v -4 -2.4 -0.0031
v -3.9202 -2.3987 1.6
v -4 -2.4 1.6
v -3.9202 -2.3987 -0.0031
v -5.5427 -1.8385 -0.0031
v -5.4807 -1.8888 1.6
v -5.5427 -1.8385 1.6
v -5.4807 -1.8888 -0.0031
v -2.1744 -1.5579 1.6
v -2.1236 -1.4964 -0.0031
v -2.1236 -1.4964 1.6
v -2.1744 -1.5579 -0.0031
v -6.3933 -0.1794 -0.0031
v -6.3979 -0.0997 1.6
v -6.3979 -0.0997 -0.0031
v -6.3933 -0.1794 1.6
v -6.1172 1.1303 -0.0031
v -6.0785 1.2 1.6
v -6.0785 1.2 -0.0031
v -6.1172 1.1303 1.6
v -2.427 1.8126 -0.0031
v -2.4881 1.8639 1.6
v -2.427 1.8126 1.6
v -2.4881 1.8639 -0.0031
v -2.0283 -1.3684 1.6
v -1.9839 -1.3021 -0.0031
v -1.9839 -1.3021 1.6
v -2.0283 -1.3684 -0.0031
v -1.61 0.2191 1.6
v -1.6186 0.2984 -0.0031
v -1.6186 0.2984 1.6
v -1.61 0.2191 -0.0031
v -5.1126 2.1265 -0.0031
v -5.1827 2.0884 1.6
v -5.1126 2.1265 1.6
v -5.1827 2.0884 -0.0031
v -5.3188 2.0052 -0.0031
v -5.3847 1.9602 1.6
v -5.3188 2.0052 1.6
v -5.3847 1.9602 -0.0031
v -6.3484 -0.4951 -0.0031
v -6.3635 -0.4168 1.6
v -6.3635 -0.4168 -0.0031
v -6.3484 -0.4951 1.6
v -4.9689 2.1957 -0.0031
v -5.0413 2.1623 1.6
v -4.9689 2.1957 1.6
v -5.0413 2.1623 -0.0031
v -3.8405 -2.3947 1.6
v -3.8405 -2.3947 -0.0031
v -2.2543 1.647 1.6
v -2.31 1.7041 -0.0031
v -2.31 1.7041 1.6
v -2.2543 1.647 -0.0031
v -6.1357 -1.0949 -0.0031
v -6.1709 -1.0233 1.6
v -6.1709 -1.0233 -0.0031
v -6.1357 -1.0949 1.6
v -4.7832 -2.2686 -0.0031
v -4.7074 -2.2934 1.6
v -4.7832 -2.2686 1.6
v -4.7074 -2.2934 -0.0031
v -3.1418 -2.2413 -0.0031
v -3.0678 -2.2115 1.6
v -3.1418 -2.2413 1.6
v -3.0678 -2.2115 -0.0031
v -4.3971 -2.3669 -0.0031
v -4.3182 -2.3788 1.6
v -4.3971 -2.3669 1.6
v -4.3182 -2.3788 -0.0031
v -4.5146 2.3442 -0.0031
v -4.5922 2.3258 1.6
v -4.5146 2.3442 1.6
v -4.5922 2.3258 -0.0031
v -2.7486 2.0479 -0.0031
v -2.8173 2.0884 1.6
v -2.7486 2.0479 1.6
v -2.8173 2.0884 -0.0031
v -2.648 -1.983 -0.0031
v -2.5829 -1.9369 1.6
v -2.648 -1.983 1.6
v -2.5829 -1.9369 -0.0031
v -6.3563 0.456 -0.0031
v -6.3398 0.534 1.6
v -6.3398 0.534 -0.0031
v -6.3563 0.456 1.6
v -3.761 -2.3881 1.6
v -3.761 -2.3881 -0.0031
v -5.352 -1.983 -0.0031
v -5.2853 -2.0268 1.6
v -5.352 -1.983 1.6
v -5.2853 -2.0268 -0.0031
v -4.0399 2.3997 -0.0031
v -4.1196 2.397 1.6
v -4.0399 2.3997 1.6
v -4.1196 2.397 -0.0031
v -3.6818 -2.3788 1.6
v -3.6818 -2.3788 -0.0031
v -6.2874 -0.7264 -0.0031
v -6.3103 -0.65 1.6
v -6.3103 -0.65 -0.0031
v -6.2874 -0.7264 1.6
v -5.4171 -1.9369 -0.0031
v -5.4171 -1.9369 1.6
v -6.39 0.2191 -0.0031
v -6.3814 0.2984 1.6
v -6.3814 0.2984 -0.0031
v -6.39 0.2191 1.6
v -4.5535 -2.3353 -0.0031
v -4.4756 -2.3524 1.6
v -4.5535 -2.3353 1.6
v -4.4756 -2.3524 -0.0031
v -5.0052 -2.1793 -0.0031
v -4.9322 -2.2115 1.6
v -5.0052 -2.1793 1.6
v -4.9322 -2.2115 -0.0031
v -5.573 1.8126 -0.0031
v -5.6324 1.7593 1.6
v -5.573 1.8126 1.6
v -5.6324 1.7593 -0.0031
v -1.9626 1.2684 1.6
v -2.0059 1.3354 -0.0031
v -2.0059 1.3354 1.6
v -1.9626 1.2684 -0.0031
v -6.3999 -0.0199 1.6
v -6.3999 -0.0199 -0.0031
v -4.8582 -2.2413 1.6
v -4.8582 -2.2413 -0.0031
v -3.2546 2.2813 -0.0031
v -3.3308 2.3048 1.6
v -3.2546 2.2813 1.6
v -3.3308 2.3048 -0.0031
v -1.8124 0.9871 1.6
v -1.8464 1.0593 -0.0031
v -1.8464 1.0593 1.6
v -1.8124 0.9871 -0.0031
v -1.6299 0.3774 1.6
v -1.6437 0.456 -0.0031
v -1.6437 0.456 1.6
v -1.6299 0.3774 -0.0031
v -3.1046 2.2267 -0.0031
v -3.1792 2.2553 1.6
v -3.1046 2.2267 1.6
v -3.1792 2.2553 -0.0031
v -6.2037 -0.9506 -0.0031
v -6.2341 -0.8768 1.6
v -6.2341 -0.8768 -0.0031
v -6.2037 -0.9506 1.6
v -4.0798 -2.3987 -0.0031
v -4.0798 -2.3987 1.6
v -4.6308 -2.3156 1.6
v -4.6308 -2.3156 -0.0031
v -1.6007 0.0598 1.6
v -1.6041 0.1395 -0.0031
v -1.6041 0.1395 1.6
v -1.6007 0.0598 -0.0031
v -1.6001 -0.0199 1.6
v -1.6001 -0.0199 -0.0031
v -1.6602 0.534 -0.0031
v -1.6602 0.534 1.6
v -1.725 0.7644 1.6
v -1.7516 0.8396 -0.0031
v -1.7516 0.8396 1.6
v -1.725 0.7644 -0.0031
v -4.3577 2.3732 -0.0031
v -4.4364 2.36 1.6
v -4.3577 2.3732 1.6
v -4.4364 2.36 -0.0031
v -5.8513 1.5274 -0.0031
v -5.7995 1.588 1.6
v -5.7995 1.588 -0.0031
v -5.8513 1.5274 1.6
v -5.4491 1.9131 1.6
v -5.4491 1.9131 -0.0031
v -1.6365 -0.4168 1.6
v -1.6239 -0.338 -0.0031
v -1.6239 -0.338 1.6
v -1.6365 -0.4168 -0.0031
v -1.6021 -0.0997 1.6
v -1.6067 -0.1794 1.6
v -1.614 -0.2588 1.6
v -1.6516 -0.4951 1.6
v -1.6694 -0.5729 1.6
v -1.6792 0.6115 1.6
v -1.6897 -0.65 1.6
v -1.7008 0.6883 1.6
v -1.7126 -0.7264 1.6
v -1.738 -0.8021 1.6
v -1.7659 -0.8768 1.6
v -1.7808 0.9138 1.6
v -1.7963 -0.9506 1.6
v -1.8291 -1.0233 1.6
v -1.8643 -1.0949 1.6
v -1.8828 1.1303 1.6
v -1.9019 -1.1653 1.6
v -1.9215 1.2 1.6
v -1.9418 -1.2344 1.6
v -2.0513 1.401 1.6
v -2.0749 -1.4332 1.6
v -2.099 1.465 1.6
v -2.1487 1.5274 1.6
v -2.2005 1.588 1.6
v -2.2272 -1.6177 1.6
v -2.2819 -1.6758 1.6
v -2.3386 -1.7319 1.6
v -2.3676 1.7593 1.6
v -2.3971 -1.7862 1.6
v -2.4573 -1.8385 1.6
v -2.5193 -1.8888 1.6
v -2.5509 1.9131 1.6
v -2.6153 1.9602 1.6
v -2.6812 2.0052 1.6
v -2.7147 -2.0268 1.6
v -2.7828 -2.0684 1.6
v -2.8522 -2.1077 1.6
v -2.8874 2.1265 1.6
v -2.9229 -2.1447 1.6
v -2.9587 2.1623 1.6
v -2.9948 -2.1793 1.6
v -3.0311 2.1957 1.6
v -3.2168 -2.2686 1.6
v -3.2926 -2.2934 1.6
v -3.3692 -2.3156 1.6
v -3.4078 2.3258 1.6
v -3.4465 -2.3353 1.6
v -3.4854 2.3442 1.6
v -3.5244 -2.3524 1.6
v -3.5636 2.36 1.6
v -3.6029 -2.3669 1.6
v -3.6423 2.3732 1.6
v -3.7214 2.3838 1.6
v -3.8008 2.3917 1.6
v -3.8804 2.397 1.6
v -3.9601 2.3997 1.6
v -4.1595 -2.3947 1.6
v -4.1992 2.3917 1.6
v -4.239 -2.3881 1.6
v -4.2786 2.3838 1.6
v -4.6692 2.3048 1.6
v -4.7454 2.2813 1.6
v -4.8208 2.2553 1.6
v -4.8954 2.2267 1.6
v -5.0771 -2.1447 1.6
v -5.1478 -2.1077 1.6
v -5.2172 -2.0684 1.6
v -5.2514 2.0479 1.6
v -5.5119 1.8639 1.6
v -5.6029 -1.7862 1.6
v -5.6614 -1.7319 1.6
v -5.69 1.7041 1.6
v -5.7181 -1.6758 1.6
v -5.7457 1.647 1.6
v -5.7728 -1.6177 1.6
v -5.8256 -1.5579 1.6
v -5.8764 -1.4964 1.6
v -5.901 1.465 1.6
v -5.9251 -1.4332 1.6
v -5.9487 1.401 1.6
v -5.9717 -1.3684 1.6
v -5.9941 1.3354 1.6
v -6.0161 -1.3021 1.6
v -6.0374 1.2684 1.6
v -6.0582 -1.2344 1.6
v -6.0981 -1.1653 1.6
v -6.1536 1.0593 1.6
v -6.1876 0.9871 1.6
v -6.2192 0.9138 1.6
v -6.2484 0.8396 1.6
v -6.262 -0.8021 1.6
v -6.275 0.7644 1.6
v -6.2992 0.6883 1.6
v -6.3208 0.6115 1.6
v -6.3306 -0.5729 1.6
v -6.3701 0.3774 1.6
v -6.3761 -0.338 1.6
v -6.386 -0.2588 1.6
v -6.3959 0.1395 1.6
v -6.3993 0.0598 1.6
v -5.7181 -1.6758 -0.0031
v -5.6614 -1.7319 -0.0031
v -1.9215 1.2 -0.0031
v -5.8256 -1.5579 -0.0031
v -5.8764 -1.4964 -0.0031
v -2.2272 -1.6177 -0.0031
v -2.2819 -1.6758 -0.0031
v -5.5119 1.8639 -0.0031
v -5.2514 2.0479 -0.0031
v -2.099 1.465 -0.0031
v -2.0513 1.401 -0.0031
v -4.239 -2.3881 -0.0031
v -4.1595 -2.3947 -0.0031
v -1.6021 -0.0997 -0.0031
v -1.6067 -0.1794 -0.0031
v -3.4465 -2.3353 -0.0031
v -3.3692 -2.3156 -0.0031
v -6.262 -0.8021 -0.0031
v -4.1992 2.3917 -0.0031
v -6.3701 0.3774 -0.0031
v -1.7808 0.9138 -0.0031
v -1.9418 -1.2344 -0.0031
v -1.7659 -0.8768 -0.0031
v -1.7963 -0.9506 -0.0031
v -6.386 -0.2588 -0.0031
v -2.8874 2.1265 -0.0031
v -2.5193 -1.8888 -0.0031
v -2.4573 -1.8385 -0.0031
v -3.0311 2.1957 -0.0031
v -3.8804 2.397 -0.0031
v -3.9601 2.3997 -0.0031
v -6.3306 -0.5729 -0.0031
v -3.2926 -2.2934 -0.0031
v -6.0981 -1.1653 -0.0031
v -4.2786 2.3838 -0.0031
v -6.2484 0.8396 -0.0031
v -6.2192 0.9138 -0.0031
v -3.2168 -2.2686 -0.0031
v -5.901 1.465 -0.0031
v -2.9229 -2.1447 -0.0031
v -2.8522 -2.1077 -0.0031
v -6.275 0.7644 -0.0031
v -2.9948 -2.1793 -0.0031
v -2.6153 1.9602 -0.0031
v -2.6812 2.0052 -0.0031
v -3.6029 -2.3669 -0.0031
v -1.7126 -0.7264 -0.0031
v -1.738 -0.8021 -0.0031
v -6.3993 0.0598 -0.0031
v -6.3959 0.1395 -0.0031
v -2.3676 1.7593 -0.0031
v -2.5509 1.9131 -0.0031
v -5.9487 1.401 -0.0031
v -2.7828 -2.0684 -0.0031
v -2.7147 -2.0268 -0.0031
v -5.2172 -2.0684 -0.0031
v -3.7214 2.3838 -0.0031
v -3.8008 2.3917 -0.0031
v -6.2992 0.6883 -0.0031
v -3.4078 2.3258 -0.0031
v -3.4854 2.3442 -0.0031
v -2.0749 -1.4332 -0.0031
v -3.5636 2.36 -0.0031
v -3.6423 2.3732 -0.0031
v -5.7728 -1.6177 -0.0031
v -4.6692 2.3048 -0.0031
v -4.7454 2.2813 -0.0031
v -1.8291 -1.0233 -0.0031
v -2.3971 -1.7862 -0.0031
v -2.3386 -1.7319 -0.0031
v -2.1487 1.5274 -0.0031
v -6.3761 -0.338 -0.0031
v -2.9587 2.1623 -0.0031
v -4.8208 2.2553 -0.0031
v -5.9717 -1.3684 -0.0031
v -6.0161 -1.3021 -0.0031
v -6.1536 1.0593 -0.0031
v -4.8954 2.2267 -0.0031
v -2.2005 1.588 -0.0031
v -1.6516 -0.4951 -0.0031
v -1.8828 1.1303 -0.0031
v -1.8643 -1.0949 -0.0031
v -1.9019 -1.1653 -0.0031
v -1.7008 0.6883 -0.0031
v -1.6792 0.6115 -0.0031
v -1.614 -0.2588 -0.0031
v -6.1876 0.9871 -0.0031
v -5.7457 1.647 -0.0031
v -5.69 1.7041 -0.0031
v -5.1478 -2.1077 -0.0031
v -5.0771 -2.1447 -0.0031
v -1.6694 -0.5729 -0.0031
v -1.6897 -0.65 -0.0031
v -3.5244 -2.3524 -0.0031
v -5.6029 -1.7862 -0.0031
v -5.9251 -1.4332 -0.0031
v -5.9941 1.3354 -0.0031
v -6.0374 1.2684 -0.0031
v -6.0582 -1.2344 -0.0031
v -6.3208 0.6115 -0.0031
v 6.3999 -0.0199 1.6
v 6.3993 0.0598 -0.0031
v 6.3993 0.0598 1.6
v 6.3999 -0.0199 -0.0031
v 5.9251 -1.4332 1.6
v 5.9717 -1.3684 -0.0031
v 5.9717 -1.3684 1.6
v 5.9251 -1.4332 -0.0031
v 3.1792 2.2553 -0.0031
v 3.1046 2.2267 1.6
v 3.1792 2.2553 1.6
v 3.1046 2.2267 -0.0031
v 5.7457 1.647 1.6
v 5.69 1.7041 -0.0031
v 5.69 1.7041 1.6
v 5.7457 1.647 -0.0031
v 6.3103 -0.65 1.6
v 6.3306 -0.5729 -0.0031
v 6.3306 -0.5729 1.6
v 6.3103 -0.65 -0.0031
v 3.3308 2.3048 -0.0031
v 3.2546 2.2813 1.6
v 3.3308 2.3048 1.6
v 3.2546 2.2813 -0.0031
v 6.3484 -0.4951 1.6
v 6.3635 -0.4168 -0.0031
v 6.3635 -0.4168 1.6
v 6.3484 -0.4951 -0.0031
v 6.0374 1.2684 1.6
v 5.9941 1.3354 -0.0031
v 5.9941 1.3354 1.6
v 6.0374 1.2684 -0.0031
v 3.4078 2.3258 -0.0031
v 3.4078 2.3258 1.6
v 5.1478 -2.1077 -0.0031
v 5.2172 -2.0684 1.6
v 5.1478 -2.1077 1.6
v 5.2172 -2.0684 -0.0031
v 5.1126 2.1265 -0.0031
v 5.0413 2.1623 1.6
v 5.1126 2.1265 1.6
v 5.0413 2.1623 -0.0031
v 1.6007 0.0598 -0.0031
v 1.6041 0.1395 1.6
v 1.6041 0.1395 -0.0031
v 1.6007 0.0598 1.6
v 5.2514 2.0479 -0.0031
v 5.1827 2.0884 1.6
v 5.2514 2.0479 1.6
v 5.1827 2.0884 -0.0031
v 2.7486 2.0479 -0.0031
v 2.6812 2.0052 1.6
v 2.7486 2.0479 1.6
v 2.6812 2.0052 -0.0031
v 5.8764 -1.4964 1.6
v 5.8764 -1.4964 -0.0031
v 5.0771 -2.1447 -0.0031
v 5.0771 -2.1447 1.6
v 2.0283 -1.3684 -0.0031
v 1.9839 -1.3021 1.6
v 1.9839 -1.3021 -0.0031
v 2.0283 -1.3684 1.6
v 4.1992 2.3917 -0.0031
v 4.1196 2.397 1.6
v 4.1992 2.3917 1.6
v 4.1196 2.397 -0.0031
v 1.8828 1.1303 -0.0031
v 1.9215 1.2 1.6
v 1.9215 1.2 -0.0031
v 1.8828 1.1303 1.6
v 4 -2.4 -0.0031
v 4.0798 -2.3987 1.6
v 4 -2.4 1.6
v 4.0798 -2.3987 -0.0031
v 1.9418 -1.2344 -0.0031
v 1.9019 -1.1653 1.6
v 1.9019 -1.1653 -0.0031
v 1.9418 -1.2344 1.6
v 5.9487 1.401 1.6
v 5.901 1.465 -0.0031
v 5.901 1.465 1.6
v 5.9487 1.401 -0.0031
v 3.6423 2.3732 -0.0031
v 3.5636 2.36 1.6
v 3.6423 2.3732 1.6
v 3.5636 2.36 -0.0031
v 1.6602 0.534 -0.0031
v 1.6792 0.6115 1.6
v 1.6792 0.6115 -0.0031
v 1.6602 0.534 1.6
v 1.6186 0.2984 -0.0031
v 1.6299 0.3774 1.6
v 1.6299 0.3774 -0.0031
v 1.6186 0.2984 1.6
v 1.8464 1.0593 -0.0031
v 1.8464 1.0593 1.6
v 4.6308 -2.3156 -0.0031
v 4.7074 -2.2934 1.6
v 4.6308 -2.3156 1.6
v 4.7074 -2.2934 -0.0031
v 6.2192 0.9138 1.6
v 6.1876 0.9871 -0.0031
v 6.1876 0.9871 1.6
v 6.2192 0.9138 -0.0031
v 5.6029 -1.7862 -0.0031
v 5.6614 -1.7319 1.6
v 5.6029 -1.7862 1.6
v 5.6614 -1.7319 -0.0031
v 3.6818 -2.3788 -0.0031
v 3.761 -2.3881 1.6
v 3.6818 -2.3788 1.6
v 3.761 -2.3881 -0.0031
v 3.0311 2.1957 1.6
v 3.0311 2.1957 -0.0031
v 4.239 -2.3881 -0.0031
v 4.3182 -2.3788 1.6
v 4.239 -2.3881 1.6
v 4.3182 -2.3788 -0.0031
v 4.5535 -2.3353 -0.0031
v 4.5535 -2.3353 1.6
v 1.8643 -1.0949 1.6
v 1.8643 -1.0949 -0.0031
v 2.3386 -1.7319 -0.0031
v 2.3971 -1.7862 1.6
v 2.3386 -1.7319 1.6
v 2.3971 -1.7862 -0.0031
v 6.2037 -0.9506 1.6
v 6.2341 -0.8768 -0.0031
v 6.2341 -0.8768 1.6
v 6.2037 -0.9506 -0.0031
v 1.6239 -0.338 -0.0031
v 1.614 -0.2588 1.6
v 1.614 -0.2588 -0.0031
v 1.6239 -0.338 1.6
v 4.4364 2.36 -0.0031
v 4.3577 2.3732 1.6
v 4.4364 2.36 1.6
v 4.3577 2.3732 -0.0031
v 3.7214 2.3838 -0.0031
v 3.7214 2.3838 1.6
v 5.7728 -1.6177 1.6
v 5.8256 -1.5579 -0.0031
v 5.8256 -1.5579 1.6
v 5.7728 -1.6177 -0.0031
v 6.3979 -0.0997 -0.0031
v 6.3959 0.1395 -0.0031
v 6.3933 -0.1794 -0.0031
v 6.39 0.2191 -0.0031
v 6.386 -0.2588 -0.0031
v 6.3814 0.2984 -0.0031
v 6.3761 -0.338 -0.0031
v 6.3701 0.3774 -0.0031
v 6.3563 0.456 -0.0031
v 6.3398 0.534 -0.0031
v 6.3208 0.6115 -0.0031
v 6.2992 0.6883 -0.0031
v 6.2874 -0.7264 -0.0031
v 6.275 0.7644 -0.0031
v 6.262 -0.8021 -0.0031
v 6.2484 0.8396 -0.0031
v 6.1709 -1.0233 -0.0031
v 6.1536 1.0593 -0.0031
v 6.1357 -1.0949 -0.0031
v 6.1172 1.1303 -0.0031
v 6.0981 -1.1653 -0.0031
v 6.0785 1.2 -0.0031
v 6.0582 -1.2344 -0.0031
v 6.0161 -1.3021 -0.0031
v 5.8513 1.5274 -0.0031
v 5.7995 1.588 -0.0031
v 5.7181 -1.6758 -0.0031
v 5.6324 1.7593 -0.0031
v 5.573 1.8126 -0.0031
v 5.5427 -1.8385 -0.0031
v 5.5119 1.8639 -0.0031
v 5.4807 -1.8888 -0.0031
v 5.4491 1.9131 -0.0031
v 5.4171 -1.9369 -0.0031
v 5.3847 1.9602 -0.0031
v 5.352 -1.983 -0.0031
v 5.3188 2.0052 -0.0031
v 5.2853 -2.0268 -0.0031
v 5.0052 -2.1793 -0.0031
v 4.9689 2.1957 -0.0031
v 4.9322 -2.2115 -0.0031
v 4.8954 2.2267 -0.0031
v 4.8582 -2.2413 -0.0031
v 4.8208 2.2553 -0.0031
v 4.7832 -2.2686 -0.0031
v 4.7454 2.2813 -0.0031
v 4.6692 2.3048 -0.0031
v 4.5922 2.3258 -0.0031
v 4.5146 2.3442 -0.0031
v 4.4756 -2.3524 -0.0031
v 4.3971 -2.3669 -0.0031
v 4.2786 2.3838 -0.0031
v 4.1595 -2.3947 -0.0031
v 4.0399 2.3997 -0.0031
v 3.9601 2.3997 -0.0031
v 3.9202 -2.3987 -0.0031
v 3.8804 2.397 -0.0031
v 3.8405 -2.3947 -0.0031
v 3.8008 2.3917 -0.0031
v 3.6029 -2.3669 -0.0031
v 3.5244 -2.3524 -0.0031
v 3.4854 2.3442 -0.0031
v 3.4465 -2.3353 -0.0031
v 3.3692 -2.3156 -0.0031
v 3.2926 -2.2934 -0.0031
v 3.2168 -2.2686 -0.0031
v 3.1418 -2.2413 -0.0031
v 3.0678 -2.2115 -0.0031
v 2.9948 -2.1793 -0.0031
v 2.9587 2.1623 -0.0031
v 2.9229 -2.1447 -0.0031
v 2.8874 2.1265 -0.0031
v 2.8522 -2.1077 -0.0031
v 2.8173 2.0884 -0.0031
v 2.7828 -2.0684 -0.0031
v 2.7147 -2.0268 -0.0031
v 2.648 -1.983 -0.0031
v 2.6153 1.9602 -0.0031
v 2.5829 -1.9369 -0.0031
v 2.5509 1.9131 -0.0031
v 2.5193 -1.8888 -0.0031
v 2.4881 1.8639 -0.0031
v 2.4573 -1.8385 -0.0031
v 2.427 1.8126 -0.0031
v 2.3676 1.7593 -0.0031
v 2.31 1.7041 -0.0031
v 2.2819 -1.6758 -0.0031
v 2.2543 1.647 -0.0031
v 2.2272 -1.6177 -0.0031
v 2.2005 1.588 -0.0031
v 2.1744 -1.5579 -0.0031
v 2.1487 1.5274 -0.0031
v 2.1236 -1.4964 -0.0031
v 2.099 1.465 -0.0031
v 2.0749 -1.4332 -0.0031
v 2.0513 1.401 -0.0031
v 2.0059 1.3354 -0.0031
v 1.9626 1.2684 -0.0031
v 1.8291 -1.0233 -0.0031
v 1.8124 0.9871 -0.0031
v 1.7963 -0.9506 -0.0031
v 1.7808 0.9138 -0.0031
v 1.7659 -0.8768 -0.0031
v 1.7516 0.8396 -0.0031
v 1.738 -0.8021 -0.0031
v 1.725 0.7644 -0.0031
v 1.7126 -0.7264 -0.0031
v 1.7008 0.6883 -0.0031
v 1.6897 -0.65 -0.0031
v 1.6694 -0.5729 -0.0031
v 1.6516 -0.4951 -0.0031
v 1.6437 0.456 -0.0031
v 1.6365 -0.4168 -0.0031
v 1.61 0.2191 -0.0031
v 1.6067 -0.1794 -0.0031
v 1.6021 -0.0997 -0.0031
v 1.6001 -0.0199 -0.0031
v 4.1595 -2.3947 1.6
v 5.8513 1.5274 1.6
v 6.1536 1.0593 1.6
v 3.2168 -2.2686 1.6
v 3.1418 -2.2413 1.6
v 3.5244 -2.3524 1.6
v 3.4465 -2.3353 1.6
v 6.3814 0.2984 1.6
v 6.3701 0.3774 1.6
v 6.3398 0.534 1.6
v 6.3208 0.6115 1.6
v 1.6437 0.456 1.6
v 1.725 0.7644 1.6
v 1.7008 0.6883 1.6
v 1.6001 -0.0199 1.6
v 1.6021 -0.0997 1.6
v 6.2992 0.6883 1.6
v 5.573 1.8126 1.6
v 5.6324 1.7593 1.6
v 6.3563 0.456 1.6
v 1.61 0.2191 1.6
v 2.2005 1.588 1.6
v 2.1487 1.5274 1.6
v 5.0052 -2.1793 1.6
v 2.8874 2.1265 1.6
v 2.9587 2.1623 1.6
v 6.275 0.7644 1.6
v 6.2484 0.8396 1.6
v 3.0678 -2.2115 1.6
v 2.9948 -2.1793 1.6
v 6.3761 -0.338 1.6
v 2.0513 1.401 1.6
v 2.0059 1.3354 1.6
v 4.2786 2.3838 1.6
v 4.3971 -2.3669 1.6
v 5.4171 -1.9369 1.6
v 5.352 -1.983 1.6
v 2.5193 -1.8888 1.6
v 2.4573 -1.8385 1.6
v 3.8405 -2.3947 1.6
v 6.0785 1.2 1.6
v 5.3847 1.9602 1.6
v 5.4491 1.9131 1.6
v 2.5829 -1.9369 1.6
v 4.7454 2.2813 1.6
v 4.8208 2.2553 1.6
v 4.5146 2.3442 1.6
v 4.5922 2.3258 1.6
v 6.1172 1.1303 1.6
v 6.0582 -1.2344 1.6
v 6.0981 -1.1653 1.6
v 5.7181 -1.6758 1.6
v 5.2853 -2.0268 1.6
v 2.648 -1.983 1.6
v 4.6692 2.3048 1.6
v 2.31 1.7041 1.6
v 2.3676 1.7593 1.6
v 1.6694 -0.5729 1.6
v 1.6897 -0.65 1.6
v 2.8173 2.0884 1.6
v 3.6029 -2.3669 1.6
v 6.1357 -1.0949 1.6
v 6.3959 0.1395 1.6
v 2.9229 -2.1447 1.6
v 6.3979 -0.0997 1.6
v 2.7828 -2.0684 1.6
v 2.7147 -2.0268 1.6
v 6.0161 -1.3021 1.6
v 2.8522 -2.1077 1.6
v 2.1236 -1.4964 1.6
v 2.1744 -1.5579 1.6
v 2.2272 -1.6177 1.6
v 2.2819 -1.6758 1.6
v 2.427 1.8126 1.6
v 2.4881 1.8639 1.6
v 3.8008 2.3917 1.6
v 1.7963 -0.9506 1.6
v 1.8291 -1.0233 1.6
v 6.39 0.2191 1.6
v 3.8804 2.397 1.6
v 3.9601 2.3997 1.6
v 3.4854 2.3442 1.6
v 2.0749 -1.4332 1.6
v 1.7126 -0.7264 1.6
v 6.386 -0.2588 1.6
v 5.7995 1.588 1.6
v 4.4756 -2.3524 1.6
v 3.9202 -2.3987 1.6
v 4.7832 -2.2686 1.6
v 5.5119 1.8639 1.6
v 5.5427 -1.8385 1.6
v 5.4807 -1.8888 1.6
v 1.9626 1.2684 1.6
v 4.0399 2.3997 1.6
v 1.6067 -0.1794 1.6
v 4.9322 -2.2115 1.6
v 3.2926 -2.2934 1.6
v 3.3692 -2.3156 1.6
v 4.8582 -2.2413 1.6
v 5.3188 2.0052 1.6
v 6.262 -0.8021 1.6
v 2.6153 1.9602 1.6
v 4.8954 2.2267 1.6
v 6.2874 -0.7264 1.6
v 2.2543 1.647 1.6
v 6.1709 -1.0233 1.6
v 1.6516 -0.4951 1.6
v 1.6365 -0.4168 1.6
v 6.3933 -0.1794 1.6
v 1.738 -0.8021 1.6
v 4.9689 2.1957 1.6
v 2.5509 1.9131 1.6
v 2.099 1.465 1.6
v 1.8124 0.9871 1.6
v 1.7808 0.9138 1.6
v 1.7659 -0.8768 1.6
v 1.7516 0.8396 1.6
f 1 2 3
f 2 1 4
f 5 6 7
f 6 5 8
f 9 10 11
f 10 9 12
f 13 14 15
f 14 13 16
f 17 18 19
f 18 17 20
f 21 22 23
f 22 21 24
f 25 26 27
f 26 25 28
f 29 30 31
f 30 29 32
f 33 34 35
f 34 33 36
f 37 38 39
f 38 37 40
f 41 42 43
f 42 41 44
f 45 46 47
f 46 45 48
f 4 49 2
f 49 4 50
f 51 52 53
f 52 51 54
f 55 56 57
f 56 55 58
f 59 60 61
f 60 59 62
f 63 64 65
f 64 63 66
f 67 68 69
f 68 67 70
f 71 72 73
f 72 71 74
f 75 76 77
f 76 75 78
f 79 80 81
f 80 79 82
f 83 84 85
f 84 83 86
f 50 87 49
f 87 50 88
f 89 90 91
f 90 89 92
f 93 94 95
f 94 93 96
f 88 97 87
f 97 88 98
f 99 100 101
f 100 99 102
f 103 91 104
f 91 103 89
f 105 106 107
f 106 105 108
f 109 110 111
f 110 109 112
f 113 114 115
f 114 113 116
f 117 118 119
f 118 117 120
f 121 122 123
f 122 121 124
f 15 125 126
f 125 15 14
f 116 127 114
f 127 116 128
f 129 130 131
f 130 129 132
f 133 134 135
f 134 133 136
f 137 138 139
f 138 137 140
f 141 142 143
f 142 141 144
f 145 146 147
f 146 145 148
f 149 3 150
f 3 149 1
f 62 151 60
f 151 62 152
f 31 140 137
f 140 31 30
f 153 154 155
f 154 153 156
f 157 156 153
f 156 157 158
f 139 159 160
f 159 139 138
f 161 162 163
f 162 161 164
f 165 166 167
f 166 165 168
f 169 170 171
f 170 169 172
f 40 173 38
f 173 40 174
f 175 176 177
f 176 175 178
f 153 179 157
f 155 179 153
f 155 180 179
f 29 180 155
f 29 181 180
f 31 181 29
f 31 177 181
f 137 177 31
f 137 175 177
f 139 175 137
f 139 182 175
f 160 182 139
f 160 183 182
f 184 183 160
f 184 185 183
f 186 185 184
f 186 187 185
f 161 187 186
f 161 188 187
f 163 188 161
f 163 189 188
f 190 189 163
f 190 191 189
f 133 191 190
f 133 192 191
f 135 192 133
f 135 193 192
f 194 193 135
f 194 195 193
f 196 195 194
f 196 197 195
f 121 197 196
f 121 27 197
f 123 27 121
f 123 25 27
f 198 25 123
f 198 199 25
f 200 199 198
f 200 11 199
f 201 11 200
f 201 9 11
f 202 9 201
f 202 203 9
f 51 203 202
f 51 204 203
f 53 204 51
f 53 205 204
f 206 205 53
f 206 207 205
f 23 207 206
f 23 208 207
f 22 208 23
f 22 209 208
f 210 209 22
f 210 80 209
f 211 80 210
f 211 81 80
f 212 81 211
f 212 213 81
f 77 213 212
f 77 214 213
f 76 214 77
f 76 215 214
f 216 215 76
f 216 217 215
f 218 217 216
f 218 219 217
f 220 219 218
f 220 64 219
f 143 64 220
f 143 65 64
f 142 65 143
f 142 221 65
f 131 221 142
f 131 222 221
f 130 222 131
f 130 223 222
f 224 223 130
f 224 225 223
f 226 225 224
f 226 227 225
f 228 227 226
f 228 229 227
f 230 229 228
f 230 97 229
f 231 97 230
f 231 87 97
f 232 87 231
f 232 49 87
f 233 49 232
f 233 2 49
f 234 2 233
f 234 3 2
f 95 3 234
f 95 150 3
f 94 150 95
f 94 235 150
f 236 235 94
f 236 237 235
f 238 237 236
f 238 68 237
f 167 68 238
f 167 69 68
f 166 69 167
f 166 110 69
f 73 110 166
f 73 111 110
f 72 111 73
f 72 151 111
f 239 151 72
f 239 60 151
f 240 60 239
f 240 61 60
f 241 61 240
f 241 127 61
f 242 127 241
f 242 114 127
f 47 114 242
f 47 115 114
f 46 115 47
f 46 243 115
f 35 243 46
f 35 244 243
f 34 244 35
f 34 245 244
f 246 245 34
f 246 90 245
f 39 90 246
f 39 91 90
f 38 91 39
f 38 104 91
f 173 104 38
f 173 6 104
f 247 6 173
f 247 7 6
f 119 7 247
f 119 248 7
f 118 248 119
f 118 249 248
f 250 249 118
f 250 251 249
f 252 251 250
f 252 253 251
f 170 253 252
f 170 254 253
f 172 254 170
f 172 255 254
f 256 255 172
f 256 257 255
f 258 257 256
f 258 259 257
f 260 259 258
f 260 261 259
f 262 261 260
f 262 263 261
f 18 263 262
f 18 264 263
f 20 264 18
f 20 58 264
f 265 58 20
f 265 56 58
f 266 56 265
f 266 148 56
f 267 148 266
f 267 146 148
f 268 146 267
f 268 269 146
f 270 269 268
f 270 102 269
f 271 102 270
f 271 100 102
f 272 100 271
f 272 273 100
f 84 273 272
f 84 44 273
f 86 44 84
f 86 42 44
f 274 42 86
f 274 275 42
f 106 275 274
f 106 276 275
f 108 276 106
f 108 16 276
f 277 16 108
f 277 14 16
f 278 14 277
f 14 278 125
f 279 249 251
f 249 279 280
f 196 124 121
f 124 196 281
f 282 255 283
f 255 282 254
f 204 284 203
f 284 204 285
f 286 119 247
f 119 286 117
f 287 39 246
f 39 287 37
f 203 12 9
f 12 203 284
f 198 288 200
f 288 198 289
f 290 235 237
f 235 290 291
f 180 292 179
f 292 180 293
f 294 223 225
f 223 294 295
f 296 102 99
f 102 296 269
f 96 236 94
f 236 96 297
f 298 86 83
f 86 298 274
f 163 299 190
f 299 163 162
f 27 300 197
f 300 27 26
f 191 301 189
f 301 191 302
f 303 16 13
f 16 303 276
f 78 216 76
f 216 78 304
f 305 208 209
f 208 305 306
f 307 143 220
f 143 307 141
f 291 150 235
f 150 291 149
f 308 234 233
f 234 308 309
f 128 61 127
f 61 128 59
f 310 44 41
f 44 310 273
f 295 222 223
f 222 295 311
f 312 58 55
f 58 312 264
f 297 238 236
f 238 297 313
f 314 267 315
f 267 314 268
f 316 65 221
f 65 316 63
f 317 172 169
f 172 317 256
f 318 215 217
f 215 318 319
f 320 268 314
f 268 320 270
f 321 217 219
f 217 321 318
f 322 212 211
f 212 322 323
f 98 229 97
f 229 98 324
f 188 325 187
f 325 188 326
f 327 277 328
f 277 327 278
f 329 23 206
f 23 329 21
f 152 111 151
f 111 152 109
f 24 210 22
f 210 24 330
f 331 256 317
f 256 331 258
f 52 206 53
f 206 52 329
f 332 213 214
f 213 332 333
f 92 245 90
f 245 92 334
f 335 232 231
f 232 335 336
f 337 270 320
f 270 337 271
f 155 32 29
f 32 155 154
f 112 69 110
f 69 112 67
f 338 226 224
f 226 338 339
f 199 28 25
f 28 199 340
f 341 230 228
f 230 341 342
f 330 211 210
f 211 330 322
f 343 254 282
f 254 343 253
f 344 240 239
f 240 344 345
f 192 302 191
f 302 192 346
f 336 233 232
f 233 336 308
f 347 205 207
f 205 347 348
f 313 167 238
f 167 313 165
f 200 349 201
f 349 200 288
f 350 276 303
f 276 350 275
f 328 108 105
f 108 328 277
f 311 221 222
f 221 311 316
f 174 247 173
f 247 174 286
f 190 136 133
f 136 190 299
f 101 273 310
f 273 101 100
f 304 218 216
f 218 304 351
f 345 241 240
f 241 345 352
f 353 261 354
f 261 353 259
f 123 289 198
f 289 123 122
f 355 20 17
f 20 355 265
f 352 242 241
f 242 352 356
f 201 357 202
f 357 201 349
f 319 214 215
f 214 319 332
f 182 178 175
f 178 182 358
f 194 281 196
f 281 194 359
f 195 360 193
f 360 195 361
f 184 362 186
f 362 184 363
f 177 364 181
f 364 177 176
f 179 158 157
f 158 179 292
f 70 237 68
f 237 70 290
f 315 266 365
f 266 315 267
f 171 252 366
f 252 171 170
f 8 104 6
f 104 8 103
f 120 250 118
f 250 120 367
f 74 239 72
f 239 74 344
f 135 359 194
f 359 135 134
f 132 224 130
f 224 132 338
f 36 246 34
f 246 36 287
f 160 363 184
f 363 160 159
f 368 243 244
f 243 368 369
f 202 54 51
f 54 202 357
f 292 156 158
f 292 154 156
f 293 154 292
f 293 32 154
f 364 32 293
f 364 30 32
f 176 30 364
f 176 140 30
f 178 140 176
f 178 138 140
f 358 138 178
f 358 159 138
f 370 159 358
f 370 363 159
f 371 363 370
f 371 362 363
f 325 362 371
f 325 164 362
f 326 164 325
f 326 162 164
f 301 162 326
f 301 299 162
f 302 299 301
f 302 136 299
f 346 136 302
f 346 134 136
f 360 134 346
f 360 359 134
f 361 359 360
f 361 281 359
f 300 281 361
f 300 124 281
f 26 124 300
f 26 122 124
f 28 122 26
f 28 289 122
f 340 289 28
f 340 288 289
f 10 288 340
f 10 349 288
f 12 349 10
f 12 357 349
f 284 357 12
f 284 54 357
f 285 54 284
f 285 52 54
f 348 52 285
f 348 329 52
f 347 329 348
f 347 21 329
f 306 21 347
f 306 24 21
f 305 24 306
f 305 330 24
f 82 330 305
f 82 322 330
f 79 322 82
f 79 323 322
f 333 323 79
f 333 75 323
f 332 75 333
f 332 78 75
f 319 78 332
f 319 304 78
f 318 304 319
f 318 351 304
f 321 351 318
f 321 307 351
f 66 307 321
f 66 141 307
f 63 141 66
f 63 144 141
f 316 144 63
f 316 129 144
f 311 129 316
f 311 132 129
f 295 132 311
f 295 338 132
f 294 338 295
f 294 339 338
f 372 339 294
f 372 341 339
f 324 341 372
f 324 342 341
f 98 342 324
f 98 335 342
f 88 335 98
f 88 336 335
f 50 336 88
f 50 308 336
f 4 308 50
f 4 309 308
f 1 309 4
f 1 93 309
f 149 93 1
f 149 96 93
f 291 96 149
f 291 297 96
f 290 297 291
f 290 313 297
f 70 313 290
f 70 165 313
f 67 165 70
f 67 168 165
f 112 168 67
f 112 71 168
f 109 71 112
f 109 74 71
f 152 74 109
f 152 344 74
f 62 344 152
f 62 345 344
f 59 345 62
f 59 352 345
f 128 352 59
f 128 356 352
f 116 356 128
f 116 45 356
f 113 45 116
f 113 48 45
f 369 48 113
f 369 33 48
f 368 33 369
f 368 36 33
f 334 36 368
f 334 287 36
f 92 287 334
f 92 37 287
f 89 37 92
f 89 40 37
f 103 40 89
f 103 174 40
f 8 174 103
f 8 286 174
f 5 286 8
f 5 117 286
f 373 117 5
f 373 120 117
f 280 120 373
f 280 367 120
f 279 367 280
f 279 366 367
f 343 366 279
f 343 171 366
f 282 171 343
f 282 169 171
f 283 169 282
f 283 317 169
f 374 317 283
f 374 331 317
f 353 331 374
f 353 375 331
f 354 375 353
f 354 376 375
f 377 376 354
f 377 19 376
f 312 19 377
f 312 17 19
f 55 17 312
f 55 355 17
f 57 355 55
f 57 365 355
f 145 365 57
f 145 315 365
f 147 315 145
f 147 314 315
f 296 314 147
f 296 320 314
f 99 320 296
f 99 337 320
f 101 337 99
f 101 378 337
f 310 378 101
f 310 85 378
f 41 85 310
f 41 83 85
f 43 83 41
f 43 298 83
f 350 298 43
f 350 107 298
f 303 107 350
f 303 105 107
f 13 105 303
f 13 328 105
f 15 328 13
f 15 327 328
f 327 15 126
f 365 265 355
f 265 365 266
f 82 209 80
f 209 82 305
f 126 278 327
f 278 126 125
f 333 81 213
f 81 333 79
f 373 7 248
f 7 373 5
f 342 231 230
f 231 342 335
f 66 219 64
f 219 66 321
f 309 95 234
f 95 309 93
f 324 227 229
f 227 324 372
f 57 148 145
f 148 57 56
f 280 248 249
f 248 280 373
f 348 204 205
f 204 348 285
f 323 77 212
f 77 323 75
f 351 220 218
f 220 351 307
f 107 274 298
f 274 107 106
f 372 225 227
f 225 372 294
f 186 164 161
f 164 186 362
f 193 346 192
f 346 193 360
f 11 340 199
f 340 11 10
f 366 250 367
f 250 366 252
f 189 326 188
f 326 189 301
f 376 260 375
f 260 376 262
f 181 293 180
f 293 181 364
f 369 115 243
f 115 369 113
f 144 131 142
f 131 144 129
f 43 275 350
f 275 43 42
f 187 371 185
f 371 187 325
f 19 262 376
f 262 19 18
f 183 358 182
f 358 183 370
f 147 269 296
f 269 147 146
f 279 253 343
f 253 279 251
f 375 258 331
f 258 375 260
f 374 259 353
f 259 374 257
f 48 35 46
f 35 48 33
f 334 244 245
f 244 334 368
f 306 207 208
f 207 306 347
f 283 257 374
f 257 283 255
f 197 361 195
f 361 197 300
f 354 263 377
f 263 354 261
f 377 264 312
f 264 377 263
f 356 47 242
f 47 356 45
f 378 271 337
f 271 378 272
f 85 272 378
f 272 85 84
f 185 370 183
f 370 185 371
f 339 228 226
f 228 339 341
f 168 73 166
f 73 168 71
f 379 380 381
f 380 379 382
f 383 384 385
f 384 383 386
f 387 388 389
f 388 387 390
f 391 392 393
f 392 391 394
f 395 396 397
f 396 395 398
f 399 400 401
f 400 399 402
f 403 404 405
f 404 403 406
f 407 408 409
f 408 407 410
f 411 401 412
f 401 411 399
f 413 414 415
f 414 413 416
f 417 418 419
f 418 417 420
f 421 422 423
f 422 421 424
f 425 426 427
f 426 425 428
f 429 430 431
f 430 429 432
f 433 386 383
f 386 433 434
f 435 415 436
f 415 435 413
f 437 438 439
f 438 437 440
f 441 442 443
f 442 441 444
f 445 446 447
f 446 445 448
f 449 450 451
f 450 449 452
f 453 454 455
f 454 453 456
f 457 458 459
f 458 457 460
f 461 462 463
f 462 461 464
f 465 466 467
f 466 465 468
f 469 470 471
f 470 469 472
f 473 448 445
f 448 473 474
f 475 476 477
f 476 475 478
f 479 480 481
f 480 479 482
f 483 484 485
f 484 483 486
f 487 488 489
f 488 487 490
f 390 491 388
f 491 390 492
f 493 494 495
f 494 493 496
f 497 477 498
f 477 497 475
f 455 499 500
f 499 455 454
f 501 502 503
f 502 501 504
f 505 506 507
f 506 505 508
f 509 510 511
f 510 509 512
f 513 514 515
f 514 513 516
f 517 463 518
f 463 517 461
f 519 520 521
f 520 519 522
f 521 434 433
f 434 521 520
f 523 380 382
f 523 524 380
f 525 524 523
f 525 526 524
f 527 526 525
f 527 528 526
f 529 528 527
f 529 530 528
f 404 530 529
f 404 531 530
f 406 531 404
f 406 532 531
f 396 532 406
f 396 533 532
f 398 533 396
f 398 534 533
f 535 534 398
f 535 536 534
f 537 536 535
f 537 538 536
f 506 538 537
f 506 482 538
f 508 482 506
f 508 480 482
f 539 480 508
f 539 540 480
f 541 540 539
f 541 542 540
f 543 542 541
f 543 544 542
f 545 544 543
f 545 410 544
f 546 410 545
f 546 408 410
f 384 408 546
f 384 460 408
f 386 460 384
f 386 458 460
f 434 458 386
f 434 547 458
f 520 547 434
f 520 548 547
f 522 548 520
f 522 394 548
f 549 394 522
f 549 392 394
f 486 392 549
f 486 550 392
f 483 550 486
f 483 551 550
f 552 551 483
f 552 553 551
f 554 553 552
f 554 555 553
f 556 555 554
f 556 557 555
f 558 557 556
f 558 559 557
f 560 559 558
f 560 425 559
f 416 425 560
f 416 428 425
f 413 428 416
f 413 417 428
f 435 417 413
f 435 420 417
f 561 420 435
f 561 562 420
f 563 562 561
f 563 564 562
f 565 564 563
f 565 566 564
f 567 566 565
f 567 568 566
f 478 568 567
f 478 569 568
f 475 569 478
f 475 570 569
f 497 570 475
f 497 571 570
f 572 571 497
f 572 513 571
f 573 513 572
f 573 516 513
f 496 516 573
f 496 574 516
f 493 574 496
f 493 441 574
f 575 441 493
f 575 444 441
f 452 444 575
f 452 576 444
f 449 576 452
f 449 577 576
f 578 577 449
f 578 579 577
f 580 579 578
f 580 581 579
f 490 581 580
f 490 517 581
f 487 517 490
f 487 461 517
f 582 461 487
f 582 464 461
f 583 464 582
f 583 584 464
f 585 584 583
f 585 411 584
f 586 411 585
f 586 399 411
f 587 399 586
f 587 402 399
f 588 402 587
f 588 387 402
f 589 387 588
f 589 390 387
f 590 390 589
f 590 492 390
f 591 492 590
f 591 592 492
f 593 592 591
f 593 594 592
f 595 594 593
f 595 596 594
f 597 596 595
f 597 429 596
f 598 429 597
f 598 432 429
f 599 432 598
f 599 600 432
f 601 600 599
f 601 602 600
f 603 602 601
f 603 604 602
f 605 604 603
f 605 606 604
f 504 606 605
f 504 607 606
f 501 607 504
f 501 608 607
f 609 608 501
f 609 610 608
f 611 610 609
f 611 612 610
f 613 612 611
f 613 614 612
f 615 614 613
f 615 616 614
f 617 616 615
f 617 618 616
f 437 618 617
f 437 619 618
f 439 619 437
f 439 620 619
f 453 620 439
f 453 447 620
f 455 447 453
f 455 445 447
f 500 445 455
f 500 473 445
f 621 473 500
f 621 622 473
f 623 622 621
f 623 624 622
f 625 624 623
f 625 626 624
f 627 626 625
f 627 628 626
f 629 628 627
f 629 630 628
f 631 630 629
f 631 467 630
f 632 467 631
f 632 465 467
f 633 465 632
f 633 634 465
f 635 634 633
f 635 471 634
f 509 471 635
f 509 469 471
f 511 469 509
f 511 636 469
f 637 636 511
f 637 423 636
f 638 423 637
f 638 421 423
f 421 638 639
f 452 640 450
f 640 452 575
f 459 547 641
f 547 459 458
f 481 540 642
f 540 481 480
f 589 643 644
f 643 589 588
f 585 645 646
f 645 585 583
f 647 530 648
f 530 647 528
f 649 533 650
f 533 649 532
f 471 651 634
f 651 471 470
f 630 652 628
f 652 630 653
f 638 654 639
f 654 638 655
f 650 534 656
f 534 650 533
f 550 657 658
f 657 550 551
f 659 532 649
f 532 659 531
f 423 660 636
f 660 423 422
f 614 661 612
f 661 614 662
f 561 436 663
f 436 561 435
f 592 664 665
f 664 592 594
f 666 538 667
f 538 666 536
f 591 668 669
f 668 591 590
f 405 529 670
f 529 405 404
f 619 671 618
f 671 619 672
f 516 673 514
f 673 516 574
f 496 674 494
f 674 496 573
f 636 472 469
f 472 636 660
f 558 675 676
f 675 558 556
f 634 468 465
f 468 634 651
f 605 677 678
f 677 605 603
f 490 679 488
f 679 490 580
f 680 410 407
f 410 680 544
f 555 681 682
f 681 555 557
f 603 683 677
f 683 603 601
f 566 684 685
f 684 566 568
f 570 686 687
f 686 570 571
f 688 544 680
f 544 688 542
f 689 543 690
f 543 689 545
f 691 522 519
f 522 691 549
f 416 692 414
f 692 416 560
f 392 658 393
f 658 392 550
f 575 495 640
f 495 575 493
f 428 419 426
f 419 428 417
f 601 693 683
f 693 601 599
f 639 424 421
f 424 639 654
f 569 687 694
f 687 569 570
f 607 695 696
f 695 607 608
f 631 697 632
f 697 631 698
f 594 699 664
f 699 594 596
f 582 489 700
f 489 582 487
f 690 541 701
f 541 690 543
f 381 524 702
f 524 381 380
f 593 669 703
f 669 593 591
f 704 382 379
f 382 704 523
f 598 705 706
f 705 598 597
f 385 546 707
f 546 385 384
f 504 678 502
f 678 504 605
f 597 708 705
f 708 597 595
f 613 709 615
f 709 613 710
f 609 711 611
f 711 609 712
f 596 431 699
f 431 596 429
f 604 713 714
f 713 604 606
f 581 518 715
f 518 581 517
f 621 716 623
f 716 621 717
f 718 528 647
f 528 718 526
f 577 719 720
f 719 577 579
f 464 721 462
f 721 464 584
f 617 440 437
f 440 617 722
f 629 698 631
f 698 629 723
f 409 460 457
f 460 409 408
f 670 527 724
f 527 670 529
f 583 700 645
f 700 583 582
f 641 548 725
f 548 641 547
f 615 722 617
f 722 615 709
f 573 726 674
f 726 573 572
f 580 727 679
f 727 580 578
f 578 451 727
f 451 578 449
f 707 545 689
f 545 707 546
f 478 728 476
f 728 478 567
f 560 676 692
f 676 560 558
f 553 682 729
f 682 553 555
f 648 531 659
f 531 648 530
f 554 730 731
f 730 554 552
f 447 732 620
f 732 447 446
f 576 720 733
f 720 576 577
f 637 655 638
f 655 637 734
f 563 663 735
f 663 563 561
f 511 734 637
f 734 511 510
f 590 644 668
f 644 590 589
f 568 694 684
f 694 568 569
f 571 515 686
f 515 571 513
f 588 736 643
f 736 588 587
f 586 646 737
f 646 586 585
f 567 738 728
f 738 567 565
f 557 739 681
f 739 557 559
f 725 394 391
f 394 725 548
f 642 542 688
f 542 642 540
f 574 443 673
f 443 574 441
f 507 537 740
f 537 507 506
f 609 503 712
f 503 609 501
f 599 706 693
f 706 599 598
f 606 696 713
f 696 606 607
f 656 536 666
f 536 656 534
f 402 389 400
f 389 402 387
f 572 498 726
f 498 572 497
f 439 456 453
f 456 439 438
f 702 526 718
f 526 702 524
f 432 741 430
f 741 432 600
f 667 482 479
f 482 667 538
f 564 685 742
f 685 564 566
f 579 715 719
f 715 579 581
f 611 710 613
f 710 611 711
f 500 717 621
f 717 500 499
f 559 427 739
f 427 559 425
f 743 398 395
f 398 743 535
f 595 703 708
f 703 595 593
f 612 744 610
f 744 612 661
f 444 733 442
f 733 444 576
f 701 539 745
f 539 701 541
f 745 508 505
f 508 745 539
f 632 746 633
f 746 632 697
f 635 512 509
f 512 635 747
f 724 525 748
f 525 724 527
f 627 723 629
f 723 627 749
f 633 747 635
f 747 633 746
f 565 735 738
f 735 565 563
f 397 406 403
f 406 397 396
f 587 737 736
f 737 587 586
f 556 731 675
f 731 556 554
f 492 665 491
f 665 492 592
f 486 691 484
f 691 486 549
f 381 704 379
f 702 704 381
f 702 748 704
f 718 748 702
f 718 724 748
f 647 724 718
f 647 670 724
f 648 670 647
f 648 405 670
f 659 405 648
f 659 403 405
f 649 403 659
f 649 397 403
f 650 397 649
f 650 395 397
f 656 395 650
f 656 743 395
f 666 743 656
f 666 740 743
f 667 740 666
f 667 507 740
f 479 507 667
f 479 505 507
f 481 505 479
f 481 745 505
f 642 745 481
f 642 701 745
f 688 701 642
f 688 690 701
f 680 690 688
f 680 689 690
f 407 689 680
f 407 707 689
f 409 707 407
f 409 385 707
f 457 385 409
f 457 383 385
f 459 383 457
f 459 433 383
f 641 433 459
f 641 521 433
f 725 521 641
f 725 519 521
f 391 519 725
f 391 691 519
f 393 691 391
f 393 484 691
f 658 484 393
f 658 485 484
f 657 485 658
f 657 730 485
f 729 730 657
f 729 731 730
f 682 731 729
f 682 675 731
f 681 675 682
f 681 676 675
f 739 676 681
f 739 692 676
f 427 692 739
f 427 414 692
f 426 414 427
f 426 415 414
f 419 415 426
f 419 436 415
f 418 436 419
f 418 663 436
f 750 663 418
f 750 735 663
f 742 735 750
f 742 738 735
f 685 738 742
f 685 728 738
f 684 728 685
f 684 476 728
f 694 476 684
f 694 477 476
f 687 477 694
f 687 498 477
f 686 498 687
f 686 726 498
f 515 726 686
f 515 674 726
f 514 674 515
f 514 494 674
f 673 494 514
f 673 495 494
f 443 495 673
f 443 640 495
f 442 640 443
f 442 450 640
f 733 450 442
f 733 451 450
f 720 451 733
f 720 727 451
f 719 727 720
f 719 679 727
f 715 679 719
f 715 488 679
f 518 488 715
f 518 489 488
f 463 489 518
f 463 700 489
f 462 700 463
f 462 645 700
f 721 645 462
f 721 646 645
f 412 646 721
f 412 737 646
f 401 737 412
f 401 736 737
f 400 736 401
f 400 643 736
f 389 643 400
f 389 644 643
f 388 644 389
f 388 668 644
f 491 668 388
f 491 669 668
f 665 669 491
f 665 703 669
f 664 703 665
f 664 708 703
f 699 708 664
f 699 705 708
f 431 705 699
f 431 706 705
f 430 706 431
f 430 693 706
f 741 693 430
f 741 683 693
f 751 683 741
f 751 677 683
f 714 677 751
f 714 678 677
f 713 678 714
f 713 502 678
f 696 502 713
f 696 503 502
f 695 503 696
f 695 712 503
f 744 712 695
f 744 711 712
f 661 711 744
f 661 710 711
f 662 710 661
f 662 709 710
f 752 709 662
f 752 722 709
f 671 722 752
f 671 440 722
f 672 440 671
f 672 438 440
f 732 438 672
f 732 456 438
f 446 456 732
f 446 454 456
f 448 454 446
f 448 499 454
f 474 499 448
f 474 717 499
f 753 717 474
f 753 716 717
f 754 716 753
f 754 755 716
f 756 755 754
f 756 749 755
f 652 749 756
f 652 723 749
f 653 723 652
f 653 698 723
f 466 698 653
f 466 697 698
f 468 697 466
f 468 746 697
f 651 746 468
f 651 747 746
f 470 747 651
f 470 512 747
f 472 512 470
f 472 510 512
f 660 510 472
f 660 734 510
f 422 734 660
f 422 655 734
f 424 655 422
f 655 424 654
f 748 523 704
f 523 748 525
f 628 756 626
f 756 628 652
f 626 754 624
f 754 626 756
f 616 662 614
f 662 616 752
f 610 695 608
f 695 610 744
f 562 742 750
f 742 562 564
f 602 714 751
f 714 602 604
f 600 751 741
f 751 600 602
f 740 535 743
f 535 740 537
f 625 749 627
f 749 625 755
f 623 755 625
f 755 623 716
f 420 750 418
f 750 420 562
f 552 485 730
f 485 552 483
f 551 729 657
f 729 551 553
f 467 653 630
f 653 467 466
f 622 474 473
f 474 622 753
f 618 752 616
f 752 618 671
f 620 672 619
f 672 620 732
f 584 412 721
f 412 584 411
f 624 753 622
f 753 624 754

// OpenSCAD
use <../lib.scad>
use <s/3298s01.scad>
$fa=1; $fs=0.2;
function ldraw_lib__3298p20(realsolid=false) = [
// 0 Slope Brick 33  3 x  2 with White Stripes Pattern
// 0 Name: 3298p20.dat
// 0 Author: James Jessiman
// 0 !LDRAW_ORG Part UPDATE 2004-02
// 0 !LICENSE Licensed under CC BY 2.0 and CC BY 4.0 : see CAreadme.txt
// 
// 0 BFC CERTIFY CCW
  [0,"BFC","CERTIFY"],
  [0,"BFC","CCW"],
// 
// 0 !HISTORY 2002-09-13 [izanette] Modified with WINDZ for BFC compliance
// 0 !HISTORY 2003-03-09 [OrionP] Moved guts to subpart
// 0 !HISTORY 2004-04-22 [PTadmin] Official Update 2004-02
// 0 !HISTORY 2007-06-25 [PTadmin] Header formatted for Contributor Agreement
// 0 !HISTORY 2008-07-01 [PTadmin] Official Update 2008-01
// 
// 
// 1 16 0 0 0 1 0 0 0 1 0 0 0 1 s\3298s01.dat
  [1,16,0,0,0,1,0,0,0,1,0,0,0,1, ldraw_lib__s__3298s01(realsolid)],
// 
// 4 16 20 20 -50 20 0 -10 16 0 -10 16 20 -50
  [4,16,20,20,-50,20,0,-10,16,0,-10,16,20,-50],
// 4 15 4 0 -10 4 20 -50 16 20 -50 16 0 -10
  [4,15,4,0,-10,4,20,-50,16,20,-50,16,0,-10],
// 4 16 4 20 -50 4 0 -10 -4 0 -10 -4 20 -50
  [4,16,4,20,-50,4,0,-10,-4,0,-10,-4,20,-50],
// 4 15 -16 0 -10 -16 20 -50 -4 20 -50 -4 0 -10
  [4,15,-16,0,-10,-16,20,-50,-4,20,-50,-4,0,-10],
// 4 16 -16 20 -50 -16 0 -10 -20 0 -10 -20 20 -50
  [4,16,-16,20,-50,-16,0,-10,-20,0,-10,-20,20,-50],
// 0
];
module ldraw_lib__3298p20(step=0, col=false, unit=2/5, alt=false, line=0.2, solid=!$preview)
    makepoly(ldraw_lib__3298p20(solid), step=step, col=col, unit=unit, alt=alt, line=line, solid=solid);
ldraw_lib__3298p20(line=0.2);
